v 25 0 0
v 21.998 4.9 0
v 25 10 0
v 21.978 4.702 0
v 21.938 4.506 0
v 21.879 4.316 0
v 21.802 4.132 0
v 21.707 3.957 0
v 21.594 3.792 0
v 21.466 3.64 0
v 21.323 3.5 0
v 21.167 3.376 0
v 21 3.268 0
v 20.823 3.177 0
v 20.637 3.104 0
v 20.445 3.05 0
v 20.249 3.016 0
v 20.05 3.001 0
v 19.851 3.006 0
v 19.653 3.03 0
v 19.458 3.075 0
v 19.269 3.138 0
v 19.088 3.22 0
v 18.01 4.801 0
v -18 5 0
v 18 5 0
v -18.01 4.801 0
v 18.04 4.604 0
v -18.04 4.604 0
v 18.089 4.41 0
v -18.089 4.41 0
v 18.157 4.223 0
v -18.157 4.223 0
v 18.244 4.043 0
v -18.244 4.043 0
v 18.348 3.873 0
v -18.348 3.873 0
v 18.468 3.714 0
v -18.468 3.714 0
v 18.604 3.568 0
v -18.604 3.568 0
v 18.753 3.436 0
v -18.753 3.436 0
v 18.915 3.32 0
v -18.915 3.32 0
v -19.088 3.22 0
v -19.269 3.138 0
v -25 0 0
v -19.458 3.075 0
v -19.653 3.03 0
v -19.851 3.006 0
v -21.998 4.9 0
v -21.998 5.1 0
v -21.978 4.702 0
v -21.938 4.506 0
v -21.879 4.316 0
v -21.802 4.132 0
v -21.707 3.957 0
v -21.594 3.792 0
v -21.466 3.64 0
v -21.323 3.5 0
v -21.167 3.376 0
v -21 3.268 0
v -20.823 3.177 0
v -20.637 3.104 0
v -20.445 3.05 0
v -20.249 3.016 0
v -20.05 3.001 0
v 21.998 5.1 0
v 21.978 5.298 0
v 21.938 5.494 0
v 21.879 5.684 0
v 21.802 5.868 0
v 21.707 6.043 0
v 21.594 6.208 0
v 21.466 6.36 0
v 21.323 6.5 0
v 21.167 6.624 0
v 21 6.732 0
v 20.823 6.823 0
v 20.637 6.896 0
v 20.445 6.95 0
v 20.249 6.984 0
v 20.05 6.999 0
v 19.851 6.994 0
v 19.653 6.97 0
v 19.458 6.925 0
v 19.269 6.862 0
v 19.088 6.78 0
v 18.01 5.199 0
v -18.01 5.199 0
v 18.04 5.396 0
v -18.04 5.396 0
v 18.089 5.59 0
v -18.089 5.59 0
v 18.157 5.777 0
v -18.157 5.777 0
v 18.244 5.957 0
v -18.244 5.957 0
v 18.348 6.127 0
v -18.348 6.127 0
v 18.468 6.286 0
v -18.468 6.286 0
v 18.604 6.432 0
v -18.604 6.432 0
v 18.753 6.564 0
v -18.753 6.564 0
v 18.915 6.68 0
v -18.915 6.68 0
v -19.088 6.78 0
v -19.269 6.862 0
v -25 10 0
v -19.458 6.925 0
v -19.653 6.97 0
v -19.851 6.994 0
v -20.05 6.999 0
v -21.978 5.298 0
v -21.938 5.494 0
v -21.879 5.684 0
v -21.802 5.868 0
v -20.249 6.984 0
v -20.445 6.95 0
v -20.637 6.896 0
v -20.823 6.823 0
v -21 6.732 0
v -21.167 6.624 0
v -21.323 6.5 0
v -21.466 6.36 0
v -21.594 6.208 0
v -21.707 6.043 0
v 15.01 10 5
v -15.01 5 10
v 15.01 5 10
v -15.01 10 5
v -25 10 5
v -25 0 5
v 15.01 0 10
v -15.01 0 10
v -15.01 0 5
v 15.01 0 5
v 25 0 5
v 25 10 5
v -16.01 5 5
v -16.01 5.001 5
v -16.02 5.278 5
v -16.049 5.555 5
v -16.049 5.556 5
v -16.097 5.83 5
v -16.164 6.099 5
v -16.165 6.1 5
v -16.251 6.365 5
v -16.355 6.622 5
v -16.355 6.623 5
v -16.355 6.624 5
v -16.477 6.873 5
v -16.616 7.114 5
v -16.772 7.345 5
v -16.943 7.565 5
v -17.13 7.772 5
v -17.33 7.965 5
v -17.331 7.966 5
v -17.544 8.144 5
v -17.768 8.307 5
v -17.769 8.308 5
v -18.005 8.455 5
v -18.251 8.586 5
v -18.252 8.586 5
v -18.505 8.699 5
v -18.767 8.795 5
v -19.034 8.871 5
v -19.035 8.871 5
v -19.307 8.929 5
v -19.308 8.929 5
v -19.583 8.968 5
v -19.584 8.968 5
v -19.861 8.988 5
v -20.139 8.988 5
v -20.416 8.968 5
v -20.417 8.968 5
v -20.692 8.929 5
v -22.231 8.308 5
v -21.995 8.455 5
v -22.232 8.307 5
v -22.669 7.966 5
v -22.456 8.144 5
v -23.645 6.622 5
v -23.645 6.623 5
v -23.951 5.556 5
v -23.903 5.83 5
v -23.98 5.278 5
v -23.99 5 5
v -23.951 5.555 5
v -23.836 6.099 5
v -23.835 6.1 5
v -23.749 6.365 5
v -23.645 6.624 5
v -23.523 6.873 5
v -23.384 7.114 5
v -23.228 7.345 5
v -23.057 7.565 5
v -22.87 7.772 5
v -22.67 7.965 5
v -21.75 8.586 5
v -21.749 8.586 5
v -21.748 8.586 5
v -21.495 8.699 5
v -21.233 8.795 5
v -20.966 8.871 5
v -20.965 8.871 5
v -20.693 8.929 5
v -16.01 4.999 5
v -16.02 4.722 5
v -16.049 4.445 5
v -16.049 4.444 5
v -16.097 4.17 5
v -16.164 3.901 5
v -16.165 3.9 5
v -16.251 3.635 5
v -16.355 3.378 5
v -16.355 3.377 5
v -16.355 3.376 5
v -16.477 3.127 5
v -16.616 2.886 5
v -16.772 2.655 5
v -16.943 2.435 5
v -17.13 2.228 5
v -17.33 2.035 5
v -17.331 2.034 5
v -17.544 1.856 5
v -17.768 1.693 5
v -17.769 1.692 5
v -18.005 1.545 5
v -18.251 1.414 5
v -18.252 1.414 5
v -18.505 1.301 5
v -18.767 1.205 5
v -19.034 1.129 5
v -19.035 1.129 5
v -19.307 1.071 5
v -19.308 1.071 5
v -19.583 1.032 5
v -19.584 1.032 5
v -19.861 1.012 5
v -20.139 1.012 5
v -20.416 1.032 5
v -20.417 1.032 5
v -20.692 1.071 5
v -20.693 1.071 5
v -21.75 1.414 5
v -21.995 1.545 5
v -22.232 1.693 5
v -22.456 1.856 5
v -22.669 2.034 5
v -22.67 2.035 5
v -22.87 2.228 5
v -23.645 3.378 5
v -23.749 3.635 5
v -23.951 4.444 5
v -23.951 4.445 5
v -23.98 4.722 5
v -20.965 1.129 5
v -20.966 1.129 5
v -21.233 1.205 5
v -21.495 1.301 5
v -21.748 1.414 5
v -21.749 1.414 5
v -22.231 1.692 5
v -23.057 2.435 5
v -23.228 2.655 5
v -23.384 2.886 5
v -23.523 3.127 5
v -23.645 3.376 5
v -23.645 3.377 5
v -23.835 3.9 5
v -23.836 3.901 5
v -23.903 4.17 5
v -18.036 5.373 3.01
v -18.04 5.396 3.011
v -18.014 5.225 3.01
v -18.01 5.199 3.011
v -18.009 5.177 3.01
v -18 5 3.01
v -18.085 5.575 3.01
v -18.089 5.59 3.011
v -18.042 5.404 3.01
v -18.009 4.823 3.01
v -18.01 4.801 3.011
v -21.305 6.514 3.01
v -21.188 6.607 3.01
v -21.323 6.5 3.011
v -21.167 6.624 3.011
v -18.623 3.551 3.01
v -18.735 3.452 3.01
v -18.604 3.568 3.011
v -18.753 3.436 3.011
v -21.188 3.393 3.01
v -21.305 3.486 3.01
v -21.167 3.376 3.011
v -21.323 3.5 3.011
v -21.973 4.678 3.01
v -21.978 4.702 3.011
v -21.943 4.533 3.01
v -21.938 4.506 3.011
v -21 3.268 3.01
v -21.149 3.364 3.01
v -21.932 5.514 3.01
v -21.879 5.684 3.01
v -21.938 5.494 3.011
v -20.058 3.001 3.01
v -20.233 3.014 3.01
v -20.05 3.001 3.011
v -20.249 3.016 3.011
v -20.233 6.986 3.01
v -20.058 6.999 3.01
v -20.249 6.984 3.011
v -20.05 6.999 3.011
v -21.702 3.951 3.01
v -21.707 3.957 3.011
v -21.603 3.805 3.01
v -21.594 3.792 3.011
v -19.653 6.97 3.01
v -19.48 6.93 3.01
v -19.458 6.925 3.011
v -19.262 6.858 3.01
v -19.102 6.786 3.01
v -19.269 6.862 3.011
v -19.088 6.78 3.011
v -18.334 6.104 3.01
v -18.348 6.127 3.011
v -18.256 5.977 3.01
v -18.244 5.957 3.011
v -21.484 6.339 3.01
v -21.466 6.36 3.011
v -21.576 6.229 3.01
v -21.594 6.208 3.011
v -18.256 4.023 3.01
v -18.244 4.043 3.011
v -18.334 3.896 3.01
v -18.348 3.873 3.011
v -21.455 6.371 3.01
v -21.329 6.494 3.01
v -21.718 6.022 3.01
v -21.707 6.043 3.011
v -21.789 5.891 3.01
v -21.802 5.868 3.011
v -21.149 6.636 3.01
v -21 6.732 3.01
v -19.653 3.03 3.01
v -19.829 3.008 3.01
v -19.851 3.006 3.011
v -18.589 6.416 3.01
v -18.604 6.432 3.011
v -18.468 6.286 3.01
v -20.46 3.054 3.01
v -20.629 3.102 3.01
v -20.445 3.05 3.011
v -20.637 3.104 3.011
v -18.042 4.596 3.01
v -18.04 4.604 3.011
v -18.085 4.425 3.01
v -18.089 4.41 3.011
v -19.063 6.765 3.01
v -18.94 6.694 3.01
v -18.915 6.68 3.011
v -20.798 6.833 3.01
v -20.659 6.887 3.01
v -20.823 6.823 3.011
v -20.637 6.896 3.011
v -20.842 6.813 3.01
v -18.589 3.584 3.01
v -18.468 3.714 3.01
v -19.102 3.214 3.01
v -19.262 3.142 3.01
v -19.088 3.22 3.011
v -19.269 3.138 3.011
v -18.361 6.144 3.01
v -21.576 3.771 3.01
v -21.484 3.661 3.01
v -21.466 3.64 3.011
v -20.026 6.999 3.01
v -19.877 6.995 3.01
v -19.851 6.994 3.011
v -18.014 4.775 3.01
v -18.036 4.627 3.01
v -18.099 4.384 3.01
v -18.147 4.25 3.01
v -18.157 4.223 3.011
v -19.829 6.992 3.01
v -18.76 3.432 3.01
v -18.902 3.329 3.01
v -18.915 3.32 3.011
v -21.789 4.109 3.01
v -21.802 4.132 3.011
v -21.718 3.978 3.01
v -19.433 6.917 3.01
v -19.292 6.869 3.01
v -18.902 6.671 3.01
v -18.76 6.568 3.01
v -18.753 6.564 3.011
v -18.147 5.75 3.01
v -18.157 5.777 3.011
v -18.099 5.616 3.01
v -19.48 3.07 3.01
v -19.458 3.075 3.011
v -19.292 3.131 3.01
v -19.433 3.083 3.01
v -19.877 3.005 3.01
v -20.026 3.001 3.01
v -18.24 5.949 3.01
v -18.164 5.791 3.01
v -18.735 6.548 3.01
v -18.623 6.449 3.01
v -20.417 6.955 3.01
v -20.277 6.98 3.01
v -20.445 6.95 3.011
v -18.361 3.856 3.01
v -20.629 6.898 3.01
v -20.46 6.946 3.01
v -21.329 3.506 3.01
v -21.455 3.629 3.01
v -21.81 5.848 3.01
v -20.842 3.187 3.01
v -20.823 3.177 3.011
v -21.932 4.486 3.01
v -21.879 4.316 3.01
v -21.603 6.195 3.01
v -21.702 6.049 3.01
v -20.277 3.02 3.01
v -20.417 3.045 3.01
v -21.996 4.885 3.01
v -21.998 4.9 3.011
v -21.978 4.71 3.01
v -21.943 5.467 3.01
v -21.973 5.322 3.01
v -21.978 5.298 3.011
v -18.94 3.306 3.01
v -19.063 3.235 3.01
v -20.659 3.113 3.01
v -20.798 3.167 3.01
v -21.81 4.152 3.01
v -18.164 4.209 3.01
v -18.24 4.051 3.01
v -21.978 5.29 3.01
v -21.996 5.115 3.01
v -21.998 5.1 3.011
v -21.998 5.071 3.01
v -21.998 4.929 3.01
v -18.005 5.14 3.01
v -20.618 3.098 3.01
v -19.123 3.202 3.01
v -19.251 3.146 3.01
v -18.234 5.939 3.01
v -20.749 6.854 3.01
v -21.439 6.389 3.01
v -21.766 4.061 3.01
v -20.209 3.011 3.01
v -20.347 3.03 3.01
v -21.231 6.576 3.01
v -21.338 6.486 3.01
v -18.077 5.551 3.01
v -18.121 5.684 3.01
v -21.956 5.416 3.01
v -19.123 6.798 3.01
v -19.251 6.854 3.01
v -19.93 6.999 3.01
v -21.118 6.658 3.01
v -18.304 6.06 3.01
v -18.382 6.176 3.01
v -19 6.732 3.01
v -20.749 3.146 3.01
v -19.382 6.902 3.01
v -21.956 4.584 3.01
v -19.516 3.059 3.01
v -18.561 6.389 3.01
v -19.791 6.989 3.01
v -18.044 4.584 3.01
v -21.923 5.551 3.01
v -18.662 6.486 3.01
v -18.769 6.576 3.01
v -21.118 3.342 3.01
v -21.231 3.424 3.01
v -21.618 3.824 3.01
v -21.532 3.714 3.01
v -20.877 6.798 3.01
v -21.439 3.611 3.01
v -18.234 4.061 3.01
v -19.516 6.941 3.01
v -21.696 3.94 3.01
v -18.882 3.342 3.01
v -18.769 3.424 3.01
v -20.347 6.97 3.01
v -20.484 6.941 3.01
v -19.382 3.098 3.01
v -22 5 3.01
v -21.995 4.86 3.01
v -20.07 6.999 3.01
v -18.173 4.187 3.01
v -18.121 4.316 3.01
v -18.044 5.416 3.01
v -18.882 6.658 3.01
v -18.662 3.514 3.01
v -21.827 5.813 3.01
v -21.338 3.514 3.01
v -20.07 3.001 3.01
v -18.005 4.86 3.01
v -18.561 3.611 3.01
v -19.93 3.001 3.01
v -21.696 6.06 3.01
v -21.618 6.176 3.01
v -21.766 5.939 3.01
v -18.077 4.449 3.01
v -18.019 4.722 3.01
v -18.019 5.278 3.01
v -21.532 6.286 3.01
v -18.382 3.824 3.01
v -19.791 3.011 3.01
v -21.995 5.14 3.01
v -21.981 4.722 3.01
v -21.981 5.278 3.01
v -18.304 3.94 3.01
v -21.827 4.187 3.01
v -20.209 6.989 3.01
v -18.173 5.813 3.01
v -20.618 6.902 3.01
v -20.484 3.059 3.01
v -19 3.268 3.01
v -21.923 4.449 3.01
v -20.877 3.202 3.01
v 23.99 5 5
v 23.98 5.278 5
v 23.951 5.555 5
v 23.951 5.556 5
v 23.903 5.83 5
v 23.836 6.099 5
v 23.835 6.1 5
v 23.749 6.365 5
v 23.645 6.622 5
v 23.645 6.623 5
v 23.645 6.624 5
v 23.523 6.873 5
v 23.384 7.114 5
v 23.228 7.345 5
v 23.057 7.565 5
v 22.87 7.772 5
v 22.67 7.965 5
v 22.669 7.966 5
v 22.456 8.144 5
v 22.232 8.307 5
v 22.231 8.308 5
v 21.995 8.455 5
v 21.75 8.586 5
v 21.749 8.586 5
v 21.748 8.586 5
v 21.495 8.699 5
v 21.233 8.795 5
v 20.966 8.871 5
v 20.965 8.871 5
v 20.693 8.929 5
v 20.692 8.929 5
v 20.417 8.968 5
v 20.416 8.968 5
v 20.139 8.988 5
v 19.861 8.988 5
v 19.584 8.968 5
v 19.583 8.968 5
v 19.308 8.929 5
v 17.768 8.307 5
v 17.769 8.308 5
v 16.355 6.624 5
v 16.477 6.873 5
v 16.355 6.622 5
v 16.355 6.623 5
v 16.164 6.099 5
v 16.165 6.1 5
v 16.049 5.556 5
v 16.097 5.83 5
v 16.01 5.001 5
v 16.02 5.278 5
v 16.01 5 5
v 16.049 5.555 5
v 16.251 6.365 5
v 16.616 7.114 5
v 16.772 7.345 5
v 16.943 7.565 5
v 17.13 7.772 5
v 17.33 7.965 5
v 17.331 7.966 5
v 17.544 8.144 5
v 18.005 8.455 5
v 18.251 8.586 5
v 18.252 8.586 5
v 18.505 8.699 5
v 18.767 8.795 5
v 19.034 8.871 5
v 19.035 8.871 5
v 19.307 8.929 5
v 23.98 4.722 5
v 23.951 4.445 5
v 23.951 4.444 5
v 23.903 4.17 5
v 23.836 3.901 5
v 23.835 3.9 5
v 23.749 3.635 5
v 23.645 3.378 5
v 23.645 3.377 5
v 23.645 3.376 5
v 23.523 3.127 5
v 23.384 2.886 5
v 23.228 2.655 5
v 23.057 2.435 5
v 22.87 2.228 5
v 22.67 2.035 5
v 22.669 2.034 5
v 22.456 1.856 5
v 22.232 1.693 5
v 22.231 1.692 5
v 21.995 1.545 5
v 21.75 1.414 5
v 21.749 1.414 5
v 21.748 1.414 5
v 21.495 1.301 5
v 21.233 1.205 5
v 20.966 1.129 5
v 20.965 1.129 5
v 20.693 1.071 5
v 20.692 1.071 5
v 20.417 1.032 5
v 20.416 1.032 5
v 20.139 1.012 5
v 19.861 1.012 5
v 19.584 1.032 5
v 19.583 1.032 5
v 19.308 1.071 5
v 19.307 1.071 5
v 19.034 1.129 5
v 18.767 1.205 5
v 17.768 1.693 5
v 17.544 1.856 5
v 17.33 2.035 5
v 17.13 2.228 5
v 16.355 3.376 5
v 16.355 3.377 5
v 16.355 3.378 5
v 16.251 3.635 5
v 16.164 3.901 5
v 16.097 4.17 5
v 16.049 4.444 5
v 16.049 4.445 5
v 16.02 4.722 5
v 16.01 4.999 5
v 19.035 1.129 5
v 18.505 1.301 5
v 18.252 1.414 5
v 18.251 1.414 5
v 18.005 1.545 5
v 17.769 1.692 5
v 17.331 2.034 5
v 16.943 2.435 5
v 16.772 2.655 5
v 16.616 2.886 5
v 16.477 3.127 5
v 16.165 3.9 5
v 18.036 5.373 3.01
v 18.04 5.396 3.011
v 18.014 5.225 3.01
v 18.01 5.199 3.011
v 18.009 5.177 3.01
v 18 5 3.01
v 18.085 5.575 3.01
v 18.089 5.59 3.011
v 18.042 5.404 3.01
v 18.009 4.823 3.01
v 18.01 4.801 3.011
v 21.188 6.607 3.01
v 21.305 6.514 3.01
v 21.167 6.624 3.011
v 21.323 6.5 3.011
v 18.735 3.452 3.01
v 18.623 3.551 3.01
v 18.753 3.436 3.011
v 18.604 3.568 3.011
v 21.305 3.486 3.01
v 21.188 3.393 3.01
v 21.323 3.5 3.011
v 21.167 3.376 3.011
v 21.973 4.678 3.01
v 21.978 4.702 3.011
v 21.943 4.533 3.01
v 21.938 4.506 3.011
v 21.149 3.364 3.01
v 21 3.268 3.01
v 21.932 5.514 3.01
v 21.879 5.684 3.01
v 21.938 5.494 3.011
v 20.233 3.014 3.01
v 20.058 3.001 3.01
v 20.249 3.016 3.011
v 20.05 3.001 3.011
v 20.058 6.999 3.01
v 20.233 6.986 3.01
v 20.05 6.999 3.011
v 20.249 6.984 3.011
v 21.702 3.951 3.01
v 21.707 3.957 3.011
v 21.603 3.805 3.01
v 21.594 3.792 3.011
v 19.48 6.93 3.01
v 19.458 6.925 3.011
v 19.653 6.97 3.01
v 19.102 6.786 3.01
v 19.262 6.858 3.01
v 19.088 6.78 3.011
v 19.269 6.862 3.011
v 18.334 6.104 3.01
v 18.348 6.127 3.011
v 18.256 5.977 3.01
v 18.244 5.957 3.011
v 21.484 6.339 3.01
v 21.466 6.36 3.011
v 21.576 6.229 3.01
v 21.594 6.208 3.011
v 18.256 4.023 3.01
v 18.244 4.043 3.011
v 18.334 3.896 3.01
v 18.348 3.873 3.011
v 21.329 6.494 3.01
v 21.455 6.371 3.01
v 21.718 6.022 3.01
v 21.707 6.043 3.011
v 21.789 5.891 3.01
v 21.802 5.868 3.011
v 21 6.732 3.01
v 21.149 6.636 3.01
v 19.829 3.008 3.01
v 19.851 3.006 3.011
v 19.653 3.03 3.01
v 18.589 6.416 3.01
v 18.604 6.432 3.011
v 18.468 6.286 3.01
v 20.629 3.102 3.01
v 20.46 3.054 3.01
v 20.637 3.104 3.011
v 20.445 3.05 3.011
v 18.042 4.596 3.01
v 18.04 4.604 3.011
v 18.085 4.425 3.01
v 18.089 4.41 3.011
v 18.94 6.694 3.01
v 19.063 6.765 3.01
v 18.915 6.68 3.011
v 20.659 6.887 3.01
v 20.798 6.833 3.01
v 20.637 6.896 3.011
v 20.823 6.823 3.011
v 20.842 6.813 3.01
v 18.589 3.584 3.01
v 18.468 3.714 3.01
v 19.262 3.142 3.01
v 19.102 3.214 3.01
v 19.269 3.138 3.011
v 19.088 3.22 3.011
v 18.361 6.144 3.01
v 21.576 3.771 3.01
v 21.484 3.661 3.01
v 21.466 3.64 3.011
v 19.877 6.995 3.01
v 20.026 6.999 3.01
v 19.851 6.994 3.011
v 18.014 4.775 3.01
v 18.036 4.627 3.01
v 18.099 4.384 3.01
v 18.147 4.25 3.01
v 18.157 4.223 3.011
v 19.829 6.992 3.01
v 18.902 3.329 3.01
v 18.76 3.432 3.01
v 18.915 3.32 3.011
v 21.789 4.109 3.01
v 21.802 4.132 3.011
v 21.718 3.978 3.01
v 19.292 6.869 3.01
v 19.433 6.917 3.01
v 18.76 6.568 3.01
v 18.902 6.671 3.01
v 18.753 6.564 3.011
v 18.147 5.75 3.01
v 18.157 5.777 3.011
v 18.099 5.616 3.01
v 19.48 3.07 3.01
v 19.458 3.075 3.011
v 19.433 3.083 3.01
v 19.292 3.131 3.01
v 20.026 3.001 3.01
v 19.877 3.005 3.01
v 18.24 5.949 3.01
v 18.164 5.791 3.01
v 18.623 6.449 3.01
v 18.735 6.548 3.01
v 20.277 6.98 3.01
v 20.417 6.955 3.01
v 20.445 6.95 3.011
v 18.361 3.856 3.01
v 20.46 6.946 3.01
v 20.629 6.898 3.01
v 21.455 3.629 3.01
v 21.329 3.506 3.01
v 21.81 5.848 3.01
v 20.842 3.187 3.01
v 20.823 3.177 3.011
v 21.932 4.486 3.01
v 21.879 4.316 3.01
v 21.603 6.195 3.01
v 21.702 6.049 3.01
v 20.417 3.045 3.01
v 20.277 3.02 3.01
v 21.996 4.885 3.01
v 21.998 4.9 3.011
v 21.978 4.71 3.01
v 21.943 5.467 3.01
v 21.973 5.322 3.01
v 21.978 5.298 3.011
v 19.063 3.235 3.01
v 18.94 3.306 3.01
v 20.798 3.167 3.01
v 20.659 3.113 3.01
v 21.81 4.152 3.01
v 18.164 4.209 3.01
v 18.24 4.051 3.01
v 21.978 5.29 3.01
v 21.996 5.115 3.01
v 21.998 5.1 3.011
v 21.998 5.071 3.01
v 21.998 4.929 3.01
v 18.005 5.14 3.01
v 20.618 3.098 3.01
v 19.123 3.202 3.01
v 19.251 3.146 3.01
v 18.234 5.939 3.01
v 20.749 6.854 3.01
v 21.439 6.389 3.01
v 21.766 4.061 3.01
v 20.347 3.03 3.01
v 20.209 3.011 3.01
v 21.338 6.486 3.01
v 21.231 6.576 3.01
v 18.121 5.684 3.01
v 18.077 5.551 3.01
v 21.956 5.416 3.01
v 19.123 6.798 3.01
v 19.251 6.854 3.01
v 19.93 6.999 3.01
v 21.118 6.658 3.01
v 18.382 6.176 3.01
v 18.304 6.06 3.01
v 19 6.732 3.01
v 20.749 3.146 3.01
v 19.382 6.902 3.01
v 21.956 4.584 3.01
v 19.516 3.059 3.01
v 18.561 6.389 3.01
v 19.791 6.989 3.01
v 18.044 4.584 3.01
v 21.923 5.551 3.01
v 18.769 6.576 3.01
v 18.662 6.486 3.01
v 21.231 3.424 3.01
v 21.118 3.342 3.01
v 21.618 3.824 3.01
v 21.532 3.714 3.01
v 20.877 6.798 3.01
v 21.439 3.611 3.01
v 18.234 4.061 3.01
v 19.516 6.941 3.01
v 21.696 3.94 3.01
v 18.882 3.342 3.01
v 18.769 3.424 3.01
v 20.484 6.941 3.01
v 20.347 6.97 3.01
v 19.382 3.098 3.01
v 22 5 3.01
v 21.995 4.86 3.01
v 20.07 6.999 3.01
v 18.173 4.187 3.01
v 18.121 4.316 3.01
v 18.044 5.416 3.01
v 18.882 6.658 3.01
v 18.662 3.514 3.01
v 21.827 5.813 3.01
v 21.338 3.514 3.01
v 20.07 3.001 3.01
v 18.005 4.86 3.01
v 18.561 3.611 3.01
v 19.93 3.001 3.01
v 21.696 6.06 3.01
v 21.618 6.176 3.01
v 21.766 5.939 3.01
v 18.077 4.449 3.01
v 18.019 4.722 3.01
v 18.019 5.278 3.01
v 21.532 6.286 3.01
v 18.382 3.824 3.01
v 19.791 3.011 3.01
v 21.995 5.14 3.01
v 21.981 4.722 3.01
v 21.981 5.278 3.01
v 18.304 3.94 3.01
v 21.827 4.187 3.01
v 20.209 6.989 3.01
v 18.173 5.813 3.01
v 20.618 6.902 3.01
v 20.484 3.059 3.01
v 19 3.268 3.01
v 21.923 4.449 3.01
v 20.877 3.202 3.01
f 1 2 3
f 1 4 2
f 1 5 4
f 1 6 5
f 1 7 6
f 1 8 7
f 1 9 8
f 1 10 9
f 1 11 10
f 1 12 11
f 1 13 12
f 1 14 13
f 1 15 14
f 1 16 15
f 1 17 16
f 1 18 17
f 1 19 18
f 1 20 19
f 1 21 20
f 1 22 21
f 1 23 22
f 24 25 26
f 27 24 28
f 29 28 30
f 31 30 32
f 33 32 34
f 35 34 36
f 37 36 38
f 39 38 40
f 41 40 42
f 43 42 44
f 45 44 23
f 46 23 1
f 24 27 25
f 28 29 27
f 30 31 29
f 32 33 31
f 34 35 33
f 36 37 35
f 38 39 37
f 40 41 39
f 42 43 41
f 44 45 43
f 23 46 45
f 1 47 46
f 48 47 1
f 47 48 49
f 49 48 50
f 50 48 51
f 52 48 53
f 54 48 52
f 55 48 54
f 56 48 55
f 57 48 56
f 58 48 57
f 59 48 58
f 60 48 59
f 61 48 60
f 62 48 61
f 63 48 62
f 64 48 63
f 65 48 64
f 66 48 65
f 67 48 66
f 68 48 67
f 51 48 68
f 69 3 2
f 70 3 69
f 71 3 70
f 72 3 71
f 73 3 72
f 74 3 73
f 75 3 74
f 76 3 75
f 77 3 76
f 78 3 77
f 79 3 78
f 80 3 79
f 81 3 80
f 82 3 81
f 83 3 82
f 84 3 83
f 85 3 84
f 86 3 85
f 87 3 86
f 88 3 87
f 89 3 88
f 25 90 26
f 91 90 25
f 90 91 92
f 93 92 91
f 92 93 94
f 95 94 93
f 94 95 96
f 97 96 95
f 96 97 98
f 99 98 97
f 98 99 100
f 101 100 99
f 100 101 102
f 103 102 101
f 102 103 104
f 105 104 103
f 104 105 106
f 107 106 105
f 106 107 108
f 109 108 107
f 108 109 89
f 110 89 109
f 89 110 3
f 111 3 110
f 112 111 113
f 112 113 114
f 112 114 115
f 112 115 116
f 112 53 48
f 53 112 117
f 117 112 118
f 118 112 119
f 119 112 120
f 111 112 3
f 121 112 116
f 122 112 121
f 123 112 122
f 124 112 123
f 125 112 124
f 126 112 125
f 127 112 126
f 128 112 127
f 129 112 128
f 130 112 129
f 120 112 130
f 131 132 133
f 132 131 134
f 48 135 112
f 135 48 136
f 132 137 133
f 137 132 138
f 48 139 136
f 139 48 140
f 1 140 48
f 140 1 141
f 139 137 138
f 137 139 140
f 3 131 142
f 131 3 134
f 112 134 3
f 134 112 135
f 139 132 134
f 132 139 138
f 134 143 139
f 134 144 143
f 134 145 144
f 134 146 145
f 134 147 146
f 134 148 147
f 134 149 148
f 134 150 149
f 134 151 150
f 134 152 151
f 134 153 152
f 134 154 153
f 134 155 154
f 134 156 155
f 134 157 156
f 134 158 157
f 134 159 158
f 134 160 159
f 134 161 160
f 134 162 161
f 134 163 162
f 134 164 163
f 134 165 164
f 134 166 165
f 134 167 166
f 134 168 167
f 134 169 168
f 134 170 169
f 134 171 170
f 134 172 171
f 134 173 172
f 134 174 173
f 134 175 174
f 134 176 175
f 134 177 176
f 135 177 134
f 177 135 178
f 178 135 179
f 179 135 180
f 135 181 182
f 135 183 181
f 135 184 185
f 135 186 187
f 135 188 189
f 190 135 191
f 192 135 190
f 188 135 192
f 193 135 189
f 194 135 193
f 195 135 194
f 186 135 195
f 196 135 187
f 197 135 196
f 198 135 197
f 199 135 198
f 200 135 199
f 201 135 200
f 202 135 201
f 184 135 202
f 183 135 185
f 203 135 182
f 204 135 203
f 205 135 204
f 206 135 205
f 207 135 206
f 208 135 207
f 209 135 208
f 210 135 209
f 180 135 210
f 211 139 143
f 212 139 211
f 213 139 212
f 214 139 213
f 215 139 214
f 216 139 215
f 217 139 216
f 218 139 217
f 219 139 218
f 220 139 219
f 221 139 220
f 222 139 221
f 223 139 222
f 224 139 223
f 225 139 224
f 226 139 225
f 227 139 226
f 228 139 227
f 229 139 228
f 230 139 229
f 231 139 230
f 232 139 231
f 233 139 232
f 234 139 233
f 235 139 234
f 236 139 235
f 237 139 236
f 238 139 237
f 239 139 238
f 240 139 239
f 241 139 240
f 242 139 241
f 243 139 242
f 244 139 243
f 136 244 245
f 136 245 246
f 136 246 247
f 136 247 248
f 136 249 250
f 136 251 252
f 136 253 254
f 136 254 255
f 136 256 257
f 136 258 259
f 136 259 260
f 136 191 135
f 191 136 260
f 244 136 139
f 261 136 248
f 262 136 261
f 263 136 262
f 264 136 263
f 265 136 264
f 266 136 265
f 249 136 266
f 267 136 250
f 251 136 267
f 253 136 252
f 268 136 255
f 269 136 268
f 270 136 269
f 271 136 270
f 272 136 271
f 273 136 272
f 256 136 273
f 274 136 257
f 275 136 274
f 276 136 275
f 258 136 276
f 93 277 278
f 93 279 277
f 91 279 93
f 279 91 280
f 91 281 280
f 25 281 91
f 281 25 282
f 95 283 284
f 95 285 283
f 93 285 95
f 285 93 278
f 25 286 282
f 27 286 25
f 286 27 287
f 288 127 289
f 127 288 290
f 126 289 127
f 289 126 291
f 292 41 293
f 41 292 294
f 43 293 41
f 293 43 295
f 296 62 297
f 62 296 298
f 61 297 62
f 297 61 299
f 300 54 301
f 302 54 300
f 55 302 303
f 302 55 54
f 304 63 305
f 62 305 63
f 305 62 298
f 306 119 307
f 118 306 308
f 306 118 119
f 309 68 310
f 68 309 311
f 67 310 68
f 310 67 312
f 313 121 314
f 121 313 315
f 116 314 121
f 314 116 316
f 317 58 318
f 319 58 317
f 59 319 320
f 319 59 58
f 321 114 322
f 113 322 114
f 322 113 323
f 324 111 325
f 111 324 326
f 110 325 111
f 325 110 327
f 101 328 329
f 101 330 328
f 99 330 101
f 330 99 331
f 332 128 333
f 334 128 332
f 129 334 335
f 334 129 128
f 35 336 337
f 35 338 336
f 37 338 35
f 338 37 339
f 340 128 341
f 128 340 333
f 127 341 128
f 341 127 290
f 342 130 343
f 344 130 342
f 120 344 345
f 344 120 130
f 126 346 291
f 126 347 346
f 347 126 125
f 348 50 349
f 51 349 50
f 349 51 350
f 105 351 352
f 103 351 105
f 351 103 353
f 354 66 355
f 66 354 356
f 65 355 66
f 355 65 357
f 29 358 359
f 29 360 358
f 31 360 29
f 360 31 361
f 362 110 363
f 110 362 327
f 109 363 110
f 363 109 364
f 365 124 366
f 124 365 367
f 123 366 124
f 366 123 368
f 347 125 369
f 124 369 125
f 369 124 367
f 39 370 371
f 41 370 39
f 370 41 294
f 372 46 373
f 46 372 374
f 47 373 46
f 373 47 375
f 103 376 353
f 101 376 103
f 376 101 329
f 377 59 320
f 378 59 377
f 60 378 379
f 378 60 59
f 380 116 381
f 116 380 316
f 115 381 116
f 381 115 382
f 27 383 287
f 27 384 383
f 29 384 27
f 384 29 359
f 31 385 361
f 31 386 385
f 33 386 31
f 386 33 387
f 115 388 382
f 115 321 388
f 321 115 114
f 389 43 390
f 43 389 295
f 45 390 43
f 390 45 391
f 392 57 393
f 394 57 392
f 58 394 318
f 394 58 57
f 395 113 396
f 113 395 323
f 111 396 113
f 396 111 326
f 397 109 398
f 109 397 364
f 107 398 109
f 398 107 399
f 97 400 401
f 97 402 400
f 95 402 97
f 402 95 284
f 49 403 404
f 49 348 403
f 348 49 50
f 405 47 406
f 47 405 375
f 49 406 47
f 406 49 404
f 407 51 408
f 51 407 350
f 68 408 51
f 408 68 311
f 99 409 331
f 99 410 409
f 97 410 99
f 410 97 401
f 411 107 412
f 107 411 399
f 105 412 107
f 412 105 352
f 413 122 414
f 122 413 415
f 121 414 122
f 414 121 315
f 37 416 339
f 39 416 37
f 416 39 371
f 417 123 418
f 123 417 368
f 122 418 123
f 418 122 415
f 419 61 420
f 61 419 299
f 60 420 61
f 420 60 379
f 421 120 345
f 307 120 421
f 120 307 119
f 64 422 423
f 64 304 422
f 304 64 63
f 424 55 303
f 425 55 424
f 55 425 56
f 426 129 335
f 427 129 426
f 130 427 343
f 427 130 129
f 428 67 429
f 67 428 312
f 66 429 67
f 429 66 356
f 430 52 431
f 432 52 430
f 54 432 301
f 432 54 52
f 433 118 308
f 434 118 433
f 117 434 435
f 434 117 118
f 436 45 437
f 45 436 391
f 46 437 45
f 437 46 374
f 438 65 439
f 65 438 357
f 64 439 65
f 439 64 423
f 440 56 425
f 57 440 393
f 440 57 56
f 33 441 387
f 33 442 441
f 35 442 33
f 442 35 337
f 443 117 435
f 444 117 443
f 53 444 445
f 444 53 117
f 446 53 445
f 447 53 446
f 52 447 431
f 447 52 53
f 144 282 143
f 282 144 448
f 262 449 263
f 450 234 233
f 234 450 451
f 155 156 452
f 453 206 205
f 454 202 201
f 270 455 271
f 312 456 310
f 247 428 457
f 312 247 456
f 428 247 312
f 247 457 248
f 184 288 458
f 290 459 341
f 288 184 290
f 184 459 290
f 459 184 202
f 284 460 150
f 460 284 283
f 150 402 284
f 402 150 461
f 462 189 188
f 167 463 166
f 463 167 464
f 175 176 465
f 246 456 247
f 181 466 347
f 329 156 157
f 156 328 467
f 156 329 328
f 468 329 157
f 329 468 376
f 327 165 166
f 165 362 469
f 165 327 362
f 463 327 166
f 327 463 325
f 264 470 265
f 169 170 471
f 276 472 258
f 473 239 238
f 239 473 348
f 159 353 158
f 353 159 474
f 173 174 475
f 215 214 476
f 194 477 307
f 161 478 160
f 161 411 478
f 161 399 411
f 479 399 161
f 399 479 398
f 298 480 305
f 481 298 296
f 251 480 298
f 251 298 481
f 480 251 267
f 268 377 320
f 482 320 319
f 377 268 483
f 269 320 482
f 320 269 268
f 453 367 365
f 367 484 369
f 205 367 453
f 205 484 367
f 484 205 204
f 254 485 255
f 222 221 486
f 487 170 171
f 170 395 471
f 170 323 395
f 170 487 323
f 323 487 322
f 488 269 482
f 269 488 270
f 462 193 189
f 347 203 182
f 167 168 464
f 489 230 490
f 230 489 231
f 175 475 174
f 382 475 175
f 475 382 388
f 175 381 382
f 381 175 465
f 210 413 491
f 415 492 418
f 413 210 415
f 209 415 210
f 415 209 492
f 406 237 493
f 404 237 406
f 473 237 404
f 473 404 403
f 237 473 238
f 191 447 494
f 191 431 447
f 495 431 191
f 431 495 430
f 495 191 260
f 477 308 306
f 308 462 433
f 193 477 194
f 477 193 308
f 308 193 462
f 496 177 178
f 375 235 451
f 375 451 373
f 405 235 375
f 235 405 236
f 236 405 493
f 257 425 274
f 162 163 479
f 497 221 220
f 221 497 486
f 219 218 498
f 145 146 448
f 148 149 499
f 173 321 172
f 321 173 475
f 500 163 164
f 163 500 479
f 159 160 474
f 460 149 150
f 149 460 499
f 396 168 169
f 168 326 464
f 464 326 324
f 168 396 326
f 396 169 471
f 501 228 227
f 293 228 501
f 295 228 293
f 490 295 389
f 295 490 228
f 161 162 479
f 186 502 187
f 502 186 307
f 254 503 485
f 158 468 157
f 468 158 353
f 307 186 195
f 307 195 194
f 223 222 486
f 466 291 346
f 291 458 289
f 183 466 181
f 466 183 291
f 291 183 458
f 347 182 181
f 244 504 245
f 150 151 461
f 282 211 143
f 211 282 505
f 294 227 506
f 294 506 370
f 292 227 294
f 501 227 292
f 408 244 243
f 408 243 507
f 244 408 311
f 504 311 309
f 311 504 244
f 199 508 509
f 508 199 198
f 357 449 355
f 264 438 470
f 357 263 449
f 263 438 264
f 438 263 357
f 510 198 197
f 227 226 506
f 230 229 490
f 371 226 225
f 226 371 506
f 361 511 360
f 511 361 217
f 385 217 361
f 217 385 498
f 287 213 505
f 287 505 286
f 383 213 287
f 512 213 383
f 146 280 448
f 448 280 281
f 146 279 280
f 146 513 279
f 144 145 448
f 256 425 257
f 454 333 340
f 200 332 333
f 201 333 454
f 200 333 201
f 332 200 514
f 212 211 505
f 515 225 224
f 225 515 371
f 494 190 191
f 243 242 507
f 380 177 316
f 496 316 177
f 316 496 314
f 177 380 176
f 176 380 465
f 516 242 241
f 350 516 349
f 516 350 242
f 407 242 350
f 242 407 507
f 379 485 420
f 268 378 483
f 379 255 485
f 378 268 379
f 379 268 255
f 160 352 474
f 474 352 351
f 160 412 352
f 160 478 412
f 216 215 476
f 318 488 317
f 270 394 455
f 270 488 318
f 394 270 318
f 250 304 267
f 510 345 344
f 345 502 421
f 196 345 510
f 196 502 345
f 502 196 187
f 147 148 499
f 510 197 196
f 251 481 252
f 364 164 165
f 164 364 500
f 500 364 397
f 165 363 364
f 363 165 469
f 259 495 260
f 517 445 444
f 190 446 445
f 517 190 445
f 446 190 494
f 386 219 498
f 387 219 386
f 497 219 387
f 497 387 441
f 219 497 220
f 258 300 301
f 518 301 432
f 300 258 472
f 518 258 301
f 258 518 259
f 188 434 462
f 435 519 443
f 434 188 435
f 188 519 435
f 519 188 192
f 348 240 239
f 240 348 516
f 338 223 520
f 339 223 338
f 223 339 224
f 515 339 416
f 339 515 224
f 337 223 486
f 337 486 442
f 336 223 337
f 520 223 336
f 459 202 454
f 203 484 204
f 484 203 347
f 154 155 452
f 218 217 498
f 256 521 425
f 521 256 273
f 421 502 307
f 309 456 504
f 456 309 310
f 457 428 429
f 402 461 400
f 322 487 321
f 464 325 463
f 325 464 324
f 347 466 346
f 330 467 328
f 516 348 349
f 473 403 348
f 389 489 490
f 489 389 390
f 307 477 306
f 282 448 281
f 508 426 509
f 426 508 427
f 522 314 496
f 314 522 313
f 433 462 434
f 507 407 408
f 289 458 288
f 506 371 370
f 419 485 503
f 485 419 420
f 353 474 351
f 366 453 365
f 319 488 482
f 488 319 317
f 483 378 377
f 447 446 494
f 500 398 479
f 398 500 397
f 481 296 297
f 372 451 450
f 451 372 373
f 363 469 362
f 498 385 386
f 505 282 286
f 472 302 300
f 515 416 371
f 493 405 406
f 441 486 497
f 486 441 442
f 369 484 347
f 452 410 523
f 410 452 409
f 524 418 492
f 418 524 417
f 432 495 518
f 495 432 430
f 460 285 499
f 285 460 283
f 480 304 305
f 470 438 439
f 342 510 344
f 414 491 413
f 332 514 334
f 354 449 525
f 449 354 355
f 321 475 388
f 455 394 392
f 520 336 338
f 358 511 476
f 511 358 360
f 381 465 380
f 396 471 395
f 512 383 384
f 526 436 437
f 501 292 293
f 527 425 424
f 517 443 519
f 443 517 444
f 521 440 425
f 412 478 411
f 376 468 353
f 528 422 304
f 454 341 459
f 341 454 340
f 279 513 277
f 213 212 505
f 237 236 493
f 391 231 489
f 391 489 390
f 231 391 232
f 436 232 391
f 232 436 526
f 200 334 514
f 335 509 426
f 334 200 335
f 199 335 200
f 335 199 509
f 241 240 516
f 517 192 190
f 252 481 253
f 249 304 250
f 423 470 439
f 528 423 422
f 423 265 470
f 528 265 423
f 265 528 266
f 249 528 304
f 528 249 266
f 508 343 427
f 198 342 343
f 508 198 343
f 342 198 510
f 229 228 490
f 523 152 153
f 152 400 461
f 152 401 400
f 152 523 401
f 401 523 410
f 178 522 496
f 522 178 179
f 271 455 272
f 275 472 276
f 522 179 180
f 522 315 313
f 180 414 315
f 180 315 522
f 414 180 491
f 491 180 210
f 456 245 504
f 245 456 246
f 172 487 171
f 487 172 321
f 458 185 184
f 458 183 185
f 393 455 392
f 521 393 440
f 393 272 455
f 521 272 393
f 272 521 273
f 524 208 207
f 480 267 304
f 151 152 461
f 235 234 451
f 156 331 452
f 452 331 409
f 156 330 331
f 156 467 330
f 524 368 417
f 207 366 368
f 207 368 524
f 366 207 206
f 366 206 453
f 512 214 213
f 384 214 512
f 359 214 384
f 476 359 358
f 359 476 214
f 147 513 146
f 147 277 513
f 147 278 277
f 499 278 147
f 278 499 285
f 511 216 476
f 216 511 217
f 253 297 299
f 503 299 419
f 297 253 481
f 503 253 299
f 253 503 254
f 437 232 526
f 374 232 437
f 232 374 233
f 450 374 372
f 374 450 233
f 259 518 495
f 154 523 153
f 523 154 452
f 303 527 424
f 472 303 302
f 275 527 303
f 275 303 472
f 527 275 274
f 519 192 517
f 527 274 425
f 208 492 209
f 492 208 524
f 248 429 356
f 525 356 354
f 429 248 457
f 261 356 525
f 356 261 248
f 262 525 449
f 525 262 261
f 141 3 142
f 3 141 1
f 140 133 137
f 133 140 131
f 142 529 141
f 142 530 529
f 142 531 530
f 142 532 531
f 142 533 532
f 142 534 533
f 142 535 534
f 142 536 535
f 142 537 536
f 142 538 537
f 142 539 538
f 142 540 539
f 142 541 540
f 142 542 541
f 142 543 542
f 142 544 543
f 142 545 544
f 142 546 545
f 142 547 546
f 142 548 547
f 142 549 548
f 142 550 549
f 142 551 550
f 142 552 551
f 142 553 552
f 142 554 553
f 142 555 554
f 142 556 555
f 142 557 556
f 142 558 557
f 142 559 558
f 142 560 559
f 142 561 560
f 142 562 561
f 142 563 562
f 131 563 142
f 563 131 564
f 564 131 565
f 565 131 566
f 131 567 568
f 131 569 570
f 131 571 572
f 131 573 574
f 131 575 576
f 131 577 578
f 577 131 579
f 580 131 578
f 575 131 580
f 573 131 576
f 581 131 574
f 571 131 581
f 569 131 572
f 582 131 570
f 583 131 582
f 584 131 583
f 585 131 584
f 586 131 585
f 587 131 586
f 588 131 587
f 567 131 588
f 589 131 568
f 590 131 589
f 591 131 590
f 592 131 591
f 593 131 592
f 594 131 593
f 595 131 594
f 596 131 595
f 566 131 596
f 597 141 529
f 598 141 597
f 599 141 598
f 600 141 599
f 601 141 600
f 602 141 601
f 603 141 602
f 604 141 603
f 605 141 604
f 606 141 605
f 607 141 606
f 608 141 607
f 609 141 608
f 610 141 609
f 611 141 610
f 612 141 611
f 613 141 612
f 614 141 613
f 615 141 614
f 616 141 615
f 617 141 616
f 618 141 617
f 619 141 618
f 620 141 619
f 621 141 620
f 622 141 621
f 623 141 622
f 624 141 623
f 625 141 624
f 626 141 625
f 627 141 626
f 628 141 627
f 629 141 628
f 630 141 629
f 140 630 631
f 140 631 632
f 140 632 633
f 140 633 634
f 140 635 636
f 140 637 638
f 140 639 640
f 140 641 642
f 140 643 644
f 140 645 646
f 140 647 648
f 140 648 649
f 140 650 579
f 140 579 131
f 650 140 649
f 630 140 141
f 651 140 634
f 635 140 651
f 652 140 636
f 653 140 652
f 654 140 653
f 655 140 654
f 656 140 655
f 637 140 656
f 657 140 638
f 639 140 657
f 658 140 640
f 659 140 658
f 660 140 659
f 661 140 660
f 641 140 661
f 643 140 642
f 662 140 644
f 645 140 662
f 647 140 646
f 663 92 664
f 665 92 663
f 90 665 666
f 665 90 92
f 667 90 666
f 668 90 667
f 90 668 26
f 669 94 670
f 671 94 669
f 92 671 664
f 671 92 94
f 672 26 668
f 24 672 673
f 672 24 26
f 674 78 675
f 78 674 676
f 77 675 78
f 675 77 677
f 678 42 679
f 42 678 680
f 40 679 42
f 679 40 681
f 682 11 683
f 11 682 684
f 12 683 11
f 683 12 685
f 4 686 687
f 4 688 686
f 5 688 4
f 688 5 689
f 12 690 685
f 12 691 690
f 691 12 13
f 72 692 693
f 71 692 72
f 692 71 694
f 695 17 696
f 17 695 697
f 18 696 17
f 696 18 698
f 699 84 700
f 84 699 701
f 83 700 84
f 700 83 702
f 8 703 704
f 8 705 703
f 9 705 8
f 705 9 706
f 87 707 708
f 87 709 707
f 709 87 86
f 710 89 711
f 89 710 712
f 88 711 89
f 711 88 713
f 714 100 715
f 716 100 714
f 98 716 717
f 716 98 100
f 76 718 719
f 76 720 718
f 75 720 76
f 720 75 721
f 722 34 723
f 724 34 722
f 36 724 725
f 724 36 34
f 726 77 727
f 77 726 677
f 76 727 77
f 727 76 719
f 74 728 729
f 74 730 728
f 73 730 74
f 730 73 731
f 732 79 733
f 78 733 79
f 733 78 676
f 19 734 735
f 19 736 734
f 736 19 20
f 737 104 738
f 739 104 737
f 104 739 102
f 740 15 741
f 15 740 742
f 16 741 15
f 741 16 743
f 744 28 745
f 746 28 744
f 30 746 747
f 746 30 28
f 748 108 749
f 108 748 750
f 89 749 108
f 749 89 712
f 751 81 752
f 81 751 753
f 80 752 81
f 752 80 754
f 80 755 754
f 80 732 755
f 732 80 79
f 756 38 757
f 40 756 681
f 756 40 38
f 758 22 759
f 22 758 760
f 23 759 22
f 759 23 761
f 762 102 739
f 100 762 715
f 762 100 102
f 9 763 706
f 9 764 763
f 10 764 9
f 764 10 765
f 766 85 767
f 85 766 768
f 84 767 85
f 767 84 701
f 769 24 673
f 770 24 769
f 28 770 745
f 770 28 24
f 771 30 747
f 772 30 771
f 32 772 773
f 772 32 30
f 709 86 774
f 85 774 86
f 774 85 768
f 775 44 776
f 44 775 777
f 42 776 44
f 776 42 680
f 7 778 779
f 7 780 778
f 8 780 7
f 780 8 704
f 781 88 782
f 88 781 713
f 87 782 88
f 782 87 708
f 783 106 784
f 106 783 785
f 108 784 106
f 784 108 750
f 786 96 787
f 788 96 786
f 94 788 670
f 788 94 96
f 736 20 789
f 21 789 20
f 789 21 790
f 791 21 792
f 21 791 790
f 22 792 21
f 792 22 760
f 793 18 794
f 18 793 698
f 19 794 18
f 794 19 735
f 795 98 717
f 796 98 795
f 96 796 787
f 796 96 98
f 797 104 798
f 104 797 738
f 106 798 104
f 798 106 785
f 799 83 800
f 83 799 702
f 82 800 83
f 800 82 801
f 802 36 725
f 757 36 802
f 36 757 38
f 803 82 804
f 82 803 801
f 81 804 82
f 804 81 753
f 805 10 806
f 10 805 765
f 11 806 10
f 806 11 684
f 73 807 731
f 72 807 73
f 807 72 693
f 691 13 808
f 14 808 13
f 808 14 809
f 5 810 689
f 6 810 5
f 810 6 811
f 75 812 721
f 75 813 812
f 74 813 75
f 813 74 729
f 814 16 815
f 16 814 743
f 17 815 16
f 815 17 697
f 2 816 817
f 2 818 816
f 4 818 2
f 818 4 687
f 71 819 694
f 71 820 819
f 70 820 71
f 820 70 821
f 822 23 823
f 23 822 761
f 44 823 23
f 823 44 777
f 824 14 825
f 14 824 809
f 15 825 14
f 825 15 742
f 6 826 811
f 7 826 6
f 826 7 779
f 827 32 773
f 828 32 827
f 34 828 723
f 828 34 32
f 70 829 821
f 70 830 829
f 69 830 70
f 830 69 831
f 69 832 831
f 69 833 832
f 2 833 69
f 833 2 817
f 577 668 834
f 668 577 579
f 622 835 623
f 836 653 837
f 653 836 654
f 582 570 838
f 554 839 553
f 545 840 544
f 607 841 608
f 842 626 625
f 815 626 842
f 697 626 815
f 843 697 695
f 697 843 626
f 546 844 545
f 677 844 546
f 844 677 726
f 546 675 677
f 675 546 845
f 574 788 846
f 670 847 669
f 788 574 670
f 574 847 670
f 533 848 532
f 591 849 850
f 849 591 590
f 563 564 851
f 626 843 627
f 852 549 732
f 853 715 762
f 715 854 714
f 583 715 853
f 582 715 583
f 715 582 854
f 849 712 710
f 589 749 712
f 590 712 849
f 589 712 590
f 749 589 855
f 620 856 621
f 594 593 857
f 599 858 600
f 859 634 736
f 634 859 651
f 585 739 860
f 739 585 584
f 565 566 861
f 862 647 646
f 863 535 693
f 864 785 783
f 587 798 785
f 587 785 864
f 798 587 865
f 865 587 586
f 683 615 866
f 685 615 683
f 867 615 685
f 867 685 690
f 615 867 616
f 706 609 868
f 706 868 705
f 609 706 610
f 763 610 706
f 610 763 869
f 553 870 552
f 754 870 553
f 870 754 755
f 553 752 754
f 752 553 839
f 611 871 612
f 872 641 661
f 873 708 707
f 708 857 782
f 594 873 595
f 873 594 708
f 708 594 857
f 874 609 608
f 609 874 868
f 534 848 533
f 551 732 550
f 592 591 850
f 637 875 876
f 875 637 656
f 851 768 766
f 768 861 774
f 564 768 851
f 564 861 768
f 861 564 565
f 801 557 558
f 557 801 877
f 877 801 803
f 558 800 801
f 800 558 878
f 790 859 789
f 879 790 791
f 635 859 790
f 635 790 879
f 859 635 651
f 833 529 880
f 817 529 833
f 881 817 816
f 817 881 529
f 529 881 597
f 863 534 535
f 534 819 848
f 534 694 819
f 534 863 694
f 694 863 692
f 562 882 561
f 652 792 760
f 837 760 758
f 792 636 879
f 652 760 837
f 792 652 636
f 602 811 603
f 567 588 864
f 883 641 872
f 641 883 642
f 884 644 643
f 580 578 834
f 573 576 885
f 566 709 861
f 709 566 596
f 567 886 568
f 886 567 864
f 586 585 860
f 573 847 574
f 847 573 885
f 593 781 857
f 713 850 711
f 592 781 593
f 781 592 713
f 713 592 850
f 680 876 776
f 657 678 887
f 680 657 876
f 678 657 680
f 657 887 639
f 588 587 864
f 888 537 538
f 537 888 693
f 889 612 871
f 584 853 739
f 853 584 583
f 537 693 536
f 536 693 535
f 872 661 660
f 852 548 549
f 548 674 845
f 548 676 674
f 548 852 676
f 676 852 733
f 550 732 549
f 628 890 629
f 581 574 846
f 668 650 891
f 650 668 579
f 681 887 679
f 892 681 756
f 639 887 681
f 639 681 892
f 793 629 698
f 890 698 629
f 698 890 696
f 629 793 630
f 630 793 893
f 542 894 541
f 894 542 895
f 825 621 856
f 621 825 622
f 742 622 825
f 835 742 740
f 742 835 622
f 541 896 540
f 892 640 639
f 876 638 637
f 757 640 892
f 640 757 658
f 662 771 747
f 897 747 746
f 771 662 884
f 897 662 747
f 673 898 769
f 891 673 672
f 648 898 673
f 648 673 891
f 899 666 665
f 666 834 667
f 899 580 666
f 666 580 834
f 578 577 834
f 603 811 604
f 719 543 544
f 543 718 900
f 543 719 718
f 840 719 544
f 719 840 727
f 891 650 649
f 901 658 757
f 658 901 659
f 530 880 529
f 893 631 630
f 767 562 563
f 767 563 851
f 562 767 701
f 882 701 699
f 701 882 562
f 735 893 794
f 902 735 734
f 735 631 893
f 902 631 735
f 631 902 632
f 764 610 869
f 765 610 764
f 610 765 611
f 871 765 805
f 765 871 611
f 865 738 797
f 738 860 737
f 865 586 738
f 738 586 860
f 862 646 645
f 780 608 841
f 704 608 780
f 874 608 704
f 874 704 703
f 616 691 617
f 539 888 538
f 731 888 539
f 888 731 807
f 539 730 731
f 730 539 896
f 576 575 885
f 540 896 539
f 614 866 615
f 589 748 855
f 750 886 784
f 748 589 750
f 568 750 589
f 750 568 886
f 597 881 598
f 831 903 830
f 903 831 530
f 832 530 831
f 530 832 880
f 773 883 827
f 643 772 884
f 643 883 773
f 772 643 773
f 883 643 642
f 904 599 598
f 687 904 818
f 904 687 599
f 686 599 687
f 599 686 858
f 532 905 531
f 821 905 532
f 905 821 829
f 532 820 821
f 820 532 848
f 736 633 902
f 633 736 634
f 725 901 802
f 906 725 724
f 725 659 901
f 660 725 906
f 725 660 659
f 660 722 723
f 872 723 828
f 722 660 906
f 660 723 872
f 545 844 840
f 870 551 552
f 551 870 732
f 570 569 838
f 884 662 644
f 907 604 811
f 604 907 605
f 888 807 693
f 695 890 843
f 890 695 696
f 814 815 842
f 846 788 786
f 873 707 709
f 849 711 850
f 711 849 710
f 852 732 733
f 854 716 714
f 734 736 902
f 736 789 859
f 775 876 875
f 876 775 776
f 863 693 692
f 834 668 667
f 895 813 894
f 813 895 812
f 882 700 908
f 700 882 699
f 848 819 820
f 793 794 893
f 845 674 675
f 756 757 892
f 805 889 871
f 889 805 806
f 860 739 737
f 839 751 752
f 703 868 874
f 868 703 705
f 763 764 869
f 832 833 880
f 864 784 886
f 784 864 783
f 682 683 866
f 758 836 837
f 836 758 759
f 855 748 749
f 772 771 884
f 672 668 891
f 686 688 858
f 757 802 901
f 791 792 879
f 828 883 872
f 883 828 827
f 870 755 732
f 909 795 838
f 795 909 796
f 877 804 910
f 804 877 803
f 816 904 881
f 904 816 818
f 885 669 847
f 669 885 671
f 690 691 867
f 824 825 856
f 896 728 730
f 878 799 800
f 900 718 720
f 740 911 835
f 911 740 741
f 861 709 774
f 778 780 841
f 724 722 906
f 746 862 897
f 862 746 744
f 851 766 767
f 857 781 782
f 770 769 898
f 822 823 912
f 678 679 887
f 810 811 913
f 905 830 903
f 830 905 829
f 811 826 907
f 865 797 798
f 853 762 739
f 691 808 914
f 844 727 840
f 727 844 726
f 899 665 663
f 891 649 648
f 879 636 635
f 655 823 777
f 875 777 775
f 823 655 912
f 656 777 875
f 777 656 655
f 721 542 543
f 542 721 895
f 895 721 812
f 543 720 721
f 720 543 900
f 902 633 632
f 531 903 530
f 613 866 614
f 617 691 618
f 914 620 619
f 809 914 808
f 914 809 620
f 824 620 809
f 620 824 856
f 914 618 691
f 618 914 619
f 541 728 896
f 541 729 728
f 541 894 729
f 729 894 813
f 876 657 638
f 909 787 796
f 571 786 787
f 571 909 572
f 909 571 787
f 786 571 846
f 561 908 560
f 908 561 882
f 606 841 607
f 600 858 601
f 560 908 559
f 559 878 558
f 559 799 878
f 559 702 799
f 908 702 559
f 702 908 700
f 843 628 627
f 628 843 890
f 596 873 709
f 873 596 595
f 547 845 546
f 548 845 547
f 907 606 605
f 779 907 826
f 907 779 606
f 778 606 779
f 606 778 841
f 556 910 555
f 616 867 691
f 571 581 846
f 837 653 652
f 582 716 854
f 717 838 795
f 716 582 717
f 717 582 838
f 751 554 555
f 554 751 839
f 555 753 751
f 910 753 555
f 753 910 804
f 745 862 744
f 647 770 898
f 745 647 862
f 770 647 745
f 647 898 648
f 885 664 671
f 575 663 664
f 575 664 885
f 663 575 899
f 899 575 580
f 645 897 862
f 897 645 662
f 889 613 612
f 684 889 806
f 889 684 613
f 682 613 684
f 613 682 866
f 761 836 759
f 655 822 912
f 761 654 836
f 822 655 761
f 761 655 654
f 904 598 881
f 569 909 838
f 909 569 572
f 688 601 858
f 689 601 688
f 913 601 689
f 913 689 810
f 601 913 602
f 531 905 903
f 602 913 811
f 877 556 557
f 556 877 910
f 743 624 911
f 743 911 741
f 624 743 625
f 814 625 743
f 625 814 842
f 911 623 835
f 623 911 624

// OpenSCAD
/*
 *
 *  In general you'll need 4 of these to constrain the
 *  foot of your circular saw.
 *
 */

/* [Saw holder] */

HEIGHT = 10;
WIDTH = 10;
LENGTH = 50;

// Diameter of the screw
SCREW = 4;

module dummy() {};

$fa = $preview? 12 : 4;
$fs = $preview? 2 : 0.2;

EPS = 0.01; 

module saw_holder(
    length=LENGTH,
    width=WIDTH,
    height=HEIGHT,
    screw=SCREW
) {

    module reflect(v=[0,1,0]) 
    { 
        children(); 
        mirror(v) children(); 
    }    

    module body() {
        rotate([0,-90]) linear_extrude(length/2) hull() {
            square([width/2, height]);
            square([width, height/2]);
        }
    }
    
    reflect([1,0,0]) 
    difference() {
        body();
        translate([-length/2 -EPS,-EPS,height/2]) cube([width,width + 2 * EPS, height/2+EPS]);
        translate([-length/2 + width/2, width/2, -EPS]) cylinder(height, r=screw/2);
        translate([-length/2 + width/2, width/2, height/2 - screw/2 + EPS]) cylinder(screw/2, r1=screw/2, r2=screw);
    }
}

assert(WIDTH >= 2 * SCREW);

saw_holder();
